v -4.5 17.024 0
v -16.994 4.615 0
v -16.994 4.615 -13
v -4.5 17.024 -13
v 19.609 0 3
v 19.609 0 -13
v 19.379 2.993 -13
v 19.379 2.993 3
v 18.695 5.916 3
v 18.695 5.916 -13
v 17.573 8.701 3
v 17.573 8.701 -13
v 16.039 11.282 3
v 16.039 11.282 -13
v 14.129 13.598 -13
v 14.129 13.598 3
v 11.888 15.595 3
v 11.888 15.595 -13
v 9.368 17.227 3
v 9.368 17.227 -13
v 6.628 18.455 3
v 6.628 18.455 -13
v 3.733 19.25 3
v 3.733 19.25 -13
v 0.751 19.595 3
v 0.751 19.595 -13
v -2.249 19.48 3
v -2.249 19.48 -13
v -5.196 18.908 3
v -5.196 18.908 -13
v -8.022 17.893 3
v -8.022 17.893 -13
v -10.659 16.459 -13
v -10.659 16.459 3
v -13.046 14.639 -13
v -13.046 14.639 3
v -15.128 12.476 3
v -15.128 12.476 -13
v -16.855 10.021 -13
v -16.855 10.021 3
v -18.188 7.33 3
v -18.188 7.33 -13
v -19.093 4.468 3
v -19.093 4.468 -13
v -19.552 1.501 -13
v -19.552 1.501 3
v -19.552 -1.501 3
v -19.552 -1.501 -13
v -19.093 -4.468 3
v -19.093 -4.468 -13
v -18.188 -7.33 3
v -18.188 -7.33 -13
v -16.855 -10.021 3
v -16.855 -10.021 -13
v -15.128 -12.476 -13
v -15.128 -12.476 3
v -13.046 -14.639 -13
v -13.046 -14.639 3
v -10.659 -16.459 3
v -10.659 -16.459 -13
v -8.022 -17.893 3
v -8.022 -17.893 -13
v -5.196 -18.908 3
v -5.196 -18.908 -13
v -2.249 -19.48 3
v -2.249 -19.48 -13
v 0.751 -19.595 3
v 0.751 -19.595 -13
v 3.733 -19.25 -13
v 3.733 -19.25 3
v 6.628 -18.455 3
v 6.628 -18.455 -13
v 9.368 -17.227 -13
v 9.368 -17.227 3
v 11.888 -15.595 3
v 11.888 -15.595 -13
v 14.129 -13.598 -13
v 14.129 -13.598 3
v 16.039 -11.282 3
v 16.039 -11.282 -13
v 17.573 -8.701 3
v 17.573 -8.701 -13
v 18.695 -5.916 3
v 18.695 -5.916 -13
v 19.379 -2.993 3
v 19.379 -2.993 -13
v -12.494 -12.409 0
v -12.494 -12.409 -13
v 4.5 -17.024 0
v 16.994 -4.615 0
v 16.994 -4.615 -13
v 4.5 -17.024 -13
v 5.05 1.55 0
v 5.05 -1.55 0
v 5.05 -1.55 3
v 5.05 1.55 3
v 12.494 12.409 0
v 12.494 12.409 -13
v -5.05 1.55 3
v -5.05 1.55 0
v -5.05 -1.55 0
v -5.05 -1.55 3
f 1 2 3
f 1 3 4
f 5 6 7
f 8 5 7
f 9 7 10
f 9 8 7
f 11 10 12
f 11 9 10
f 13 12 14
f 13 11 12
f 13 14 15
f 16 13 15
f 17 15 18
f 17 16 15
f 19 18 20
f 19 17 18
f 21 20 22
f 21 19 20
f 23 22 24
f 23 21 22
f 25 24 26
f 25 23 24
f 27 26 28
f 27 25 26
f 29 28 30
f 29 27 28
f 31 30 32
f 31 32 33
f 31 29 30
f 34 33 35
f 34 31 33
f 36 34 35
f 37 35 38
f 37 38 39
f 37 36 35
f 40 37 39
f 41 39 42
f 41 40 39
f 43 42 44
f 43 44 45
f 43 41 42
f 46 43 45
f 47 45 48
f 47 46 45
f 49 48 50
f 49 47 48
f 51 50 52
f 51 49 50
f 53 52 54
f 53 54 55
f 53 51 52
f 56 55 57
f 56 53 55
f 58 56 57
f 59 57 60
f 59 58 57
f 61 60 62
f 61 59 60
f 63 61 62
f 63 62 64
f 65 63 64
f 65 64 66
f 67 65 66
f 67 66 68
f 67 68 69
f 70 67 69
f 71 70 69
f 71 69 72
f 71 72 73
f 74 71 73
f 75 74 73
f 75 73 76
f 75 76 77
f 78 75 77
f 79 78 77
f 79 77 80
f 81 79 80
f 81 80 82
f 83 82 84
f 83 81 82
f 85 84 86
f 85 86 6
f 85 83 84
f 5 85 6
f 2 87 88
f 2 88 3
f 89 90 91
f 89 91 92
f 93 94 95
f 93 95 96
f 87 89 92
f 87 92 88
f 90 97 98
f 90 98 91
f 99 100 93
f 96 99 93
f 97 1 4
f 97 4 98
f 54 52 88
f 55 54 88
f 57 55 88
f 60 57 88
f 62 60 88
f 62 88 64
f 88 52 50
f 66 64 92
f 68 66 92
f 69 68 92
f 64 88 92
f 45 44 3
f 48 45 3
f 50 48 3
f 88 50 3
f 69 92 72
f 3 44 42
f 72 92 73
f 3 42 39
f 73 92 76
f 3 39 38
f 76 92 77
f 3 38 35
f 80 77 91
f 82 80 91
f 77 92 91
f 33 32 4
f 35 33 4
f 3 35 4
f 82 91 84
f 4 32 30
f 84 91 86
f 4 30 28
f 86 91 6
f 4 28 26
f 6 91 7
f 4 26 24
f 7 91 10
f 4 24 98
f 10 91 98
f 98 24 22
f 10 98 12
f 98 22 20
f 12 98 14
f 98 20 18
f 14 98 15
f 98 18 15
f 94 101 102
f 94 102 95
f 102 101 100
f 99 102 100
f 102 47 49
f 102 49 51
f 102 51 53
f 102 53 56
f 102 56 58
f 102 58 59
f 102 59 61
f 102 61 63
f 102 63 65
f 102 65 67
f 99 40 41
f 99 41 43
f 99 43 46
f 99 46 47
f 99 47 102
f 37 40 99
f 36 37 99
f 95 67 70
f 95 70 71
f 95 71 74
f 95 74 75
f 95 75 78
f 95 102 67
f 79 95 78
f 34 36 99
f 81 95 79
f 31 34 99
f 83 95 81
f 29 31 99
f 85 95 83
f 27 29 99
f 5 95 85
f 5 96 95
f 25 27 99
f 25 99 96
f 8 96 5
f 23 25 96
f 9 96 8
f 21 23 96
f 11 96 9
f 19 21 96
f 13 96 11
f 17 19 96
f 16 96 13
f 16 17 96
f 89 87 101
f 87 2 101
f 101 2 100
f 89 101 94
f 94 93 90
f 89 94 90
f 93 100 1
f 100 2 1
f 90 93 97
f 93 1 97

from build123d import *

# Parameters (mm, degrees)
F0_R     = 19.609183
F0_W     = 10.1
F0_H     = 3.1
F1_DEPTH = 3
F2_DEPTH = 13


with BuildPart() as f1:
    # F0 (on Top) → F1 (new body)
    with BuildSketch(Plane.XY):
        Circle(F0_R)
        Polygon((-12.493552, -12.409452), (-16.993677, 4.615007), (-4.500125, 17.024459), (12.493552, 12.409452), (16.993677, -4.615007), (4.500125, -17.024459), align=None, mode=Mode.SUBTRACT)
        Polygon((-4.500125, 17.024459), (-16.993677, 4.615007), (-12.493552, -12.409452), (4.500125, -17.024459), (16.993677, -4.615007), (12.493552, 12.409452), align=None)
        Rectangle(F0_W, F0_H, mode=Mode.SUBTRACT)
    extrude(amount=F1_DEPTH)

    # F0 (on Top) → F2 (join)
    with BuildSketch(Plane.XY):
        Circle(F0_R)
        Polygon((-12.493552, -12.409452), (-16.993677, 4.615007), (-4.500125, 17.024459), (12.493552, 12.409452), (16.993677, -4.615007), (4.500125, -17.024459), align=None, mode=Mode.SUBTRACT)
    extrude(amount=-F2_DEPTH)


solid = f1.part
